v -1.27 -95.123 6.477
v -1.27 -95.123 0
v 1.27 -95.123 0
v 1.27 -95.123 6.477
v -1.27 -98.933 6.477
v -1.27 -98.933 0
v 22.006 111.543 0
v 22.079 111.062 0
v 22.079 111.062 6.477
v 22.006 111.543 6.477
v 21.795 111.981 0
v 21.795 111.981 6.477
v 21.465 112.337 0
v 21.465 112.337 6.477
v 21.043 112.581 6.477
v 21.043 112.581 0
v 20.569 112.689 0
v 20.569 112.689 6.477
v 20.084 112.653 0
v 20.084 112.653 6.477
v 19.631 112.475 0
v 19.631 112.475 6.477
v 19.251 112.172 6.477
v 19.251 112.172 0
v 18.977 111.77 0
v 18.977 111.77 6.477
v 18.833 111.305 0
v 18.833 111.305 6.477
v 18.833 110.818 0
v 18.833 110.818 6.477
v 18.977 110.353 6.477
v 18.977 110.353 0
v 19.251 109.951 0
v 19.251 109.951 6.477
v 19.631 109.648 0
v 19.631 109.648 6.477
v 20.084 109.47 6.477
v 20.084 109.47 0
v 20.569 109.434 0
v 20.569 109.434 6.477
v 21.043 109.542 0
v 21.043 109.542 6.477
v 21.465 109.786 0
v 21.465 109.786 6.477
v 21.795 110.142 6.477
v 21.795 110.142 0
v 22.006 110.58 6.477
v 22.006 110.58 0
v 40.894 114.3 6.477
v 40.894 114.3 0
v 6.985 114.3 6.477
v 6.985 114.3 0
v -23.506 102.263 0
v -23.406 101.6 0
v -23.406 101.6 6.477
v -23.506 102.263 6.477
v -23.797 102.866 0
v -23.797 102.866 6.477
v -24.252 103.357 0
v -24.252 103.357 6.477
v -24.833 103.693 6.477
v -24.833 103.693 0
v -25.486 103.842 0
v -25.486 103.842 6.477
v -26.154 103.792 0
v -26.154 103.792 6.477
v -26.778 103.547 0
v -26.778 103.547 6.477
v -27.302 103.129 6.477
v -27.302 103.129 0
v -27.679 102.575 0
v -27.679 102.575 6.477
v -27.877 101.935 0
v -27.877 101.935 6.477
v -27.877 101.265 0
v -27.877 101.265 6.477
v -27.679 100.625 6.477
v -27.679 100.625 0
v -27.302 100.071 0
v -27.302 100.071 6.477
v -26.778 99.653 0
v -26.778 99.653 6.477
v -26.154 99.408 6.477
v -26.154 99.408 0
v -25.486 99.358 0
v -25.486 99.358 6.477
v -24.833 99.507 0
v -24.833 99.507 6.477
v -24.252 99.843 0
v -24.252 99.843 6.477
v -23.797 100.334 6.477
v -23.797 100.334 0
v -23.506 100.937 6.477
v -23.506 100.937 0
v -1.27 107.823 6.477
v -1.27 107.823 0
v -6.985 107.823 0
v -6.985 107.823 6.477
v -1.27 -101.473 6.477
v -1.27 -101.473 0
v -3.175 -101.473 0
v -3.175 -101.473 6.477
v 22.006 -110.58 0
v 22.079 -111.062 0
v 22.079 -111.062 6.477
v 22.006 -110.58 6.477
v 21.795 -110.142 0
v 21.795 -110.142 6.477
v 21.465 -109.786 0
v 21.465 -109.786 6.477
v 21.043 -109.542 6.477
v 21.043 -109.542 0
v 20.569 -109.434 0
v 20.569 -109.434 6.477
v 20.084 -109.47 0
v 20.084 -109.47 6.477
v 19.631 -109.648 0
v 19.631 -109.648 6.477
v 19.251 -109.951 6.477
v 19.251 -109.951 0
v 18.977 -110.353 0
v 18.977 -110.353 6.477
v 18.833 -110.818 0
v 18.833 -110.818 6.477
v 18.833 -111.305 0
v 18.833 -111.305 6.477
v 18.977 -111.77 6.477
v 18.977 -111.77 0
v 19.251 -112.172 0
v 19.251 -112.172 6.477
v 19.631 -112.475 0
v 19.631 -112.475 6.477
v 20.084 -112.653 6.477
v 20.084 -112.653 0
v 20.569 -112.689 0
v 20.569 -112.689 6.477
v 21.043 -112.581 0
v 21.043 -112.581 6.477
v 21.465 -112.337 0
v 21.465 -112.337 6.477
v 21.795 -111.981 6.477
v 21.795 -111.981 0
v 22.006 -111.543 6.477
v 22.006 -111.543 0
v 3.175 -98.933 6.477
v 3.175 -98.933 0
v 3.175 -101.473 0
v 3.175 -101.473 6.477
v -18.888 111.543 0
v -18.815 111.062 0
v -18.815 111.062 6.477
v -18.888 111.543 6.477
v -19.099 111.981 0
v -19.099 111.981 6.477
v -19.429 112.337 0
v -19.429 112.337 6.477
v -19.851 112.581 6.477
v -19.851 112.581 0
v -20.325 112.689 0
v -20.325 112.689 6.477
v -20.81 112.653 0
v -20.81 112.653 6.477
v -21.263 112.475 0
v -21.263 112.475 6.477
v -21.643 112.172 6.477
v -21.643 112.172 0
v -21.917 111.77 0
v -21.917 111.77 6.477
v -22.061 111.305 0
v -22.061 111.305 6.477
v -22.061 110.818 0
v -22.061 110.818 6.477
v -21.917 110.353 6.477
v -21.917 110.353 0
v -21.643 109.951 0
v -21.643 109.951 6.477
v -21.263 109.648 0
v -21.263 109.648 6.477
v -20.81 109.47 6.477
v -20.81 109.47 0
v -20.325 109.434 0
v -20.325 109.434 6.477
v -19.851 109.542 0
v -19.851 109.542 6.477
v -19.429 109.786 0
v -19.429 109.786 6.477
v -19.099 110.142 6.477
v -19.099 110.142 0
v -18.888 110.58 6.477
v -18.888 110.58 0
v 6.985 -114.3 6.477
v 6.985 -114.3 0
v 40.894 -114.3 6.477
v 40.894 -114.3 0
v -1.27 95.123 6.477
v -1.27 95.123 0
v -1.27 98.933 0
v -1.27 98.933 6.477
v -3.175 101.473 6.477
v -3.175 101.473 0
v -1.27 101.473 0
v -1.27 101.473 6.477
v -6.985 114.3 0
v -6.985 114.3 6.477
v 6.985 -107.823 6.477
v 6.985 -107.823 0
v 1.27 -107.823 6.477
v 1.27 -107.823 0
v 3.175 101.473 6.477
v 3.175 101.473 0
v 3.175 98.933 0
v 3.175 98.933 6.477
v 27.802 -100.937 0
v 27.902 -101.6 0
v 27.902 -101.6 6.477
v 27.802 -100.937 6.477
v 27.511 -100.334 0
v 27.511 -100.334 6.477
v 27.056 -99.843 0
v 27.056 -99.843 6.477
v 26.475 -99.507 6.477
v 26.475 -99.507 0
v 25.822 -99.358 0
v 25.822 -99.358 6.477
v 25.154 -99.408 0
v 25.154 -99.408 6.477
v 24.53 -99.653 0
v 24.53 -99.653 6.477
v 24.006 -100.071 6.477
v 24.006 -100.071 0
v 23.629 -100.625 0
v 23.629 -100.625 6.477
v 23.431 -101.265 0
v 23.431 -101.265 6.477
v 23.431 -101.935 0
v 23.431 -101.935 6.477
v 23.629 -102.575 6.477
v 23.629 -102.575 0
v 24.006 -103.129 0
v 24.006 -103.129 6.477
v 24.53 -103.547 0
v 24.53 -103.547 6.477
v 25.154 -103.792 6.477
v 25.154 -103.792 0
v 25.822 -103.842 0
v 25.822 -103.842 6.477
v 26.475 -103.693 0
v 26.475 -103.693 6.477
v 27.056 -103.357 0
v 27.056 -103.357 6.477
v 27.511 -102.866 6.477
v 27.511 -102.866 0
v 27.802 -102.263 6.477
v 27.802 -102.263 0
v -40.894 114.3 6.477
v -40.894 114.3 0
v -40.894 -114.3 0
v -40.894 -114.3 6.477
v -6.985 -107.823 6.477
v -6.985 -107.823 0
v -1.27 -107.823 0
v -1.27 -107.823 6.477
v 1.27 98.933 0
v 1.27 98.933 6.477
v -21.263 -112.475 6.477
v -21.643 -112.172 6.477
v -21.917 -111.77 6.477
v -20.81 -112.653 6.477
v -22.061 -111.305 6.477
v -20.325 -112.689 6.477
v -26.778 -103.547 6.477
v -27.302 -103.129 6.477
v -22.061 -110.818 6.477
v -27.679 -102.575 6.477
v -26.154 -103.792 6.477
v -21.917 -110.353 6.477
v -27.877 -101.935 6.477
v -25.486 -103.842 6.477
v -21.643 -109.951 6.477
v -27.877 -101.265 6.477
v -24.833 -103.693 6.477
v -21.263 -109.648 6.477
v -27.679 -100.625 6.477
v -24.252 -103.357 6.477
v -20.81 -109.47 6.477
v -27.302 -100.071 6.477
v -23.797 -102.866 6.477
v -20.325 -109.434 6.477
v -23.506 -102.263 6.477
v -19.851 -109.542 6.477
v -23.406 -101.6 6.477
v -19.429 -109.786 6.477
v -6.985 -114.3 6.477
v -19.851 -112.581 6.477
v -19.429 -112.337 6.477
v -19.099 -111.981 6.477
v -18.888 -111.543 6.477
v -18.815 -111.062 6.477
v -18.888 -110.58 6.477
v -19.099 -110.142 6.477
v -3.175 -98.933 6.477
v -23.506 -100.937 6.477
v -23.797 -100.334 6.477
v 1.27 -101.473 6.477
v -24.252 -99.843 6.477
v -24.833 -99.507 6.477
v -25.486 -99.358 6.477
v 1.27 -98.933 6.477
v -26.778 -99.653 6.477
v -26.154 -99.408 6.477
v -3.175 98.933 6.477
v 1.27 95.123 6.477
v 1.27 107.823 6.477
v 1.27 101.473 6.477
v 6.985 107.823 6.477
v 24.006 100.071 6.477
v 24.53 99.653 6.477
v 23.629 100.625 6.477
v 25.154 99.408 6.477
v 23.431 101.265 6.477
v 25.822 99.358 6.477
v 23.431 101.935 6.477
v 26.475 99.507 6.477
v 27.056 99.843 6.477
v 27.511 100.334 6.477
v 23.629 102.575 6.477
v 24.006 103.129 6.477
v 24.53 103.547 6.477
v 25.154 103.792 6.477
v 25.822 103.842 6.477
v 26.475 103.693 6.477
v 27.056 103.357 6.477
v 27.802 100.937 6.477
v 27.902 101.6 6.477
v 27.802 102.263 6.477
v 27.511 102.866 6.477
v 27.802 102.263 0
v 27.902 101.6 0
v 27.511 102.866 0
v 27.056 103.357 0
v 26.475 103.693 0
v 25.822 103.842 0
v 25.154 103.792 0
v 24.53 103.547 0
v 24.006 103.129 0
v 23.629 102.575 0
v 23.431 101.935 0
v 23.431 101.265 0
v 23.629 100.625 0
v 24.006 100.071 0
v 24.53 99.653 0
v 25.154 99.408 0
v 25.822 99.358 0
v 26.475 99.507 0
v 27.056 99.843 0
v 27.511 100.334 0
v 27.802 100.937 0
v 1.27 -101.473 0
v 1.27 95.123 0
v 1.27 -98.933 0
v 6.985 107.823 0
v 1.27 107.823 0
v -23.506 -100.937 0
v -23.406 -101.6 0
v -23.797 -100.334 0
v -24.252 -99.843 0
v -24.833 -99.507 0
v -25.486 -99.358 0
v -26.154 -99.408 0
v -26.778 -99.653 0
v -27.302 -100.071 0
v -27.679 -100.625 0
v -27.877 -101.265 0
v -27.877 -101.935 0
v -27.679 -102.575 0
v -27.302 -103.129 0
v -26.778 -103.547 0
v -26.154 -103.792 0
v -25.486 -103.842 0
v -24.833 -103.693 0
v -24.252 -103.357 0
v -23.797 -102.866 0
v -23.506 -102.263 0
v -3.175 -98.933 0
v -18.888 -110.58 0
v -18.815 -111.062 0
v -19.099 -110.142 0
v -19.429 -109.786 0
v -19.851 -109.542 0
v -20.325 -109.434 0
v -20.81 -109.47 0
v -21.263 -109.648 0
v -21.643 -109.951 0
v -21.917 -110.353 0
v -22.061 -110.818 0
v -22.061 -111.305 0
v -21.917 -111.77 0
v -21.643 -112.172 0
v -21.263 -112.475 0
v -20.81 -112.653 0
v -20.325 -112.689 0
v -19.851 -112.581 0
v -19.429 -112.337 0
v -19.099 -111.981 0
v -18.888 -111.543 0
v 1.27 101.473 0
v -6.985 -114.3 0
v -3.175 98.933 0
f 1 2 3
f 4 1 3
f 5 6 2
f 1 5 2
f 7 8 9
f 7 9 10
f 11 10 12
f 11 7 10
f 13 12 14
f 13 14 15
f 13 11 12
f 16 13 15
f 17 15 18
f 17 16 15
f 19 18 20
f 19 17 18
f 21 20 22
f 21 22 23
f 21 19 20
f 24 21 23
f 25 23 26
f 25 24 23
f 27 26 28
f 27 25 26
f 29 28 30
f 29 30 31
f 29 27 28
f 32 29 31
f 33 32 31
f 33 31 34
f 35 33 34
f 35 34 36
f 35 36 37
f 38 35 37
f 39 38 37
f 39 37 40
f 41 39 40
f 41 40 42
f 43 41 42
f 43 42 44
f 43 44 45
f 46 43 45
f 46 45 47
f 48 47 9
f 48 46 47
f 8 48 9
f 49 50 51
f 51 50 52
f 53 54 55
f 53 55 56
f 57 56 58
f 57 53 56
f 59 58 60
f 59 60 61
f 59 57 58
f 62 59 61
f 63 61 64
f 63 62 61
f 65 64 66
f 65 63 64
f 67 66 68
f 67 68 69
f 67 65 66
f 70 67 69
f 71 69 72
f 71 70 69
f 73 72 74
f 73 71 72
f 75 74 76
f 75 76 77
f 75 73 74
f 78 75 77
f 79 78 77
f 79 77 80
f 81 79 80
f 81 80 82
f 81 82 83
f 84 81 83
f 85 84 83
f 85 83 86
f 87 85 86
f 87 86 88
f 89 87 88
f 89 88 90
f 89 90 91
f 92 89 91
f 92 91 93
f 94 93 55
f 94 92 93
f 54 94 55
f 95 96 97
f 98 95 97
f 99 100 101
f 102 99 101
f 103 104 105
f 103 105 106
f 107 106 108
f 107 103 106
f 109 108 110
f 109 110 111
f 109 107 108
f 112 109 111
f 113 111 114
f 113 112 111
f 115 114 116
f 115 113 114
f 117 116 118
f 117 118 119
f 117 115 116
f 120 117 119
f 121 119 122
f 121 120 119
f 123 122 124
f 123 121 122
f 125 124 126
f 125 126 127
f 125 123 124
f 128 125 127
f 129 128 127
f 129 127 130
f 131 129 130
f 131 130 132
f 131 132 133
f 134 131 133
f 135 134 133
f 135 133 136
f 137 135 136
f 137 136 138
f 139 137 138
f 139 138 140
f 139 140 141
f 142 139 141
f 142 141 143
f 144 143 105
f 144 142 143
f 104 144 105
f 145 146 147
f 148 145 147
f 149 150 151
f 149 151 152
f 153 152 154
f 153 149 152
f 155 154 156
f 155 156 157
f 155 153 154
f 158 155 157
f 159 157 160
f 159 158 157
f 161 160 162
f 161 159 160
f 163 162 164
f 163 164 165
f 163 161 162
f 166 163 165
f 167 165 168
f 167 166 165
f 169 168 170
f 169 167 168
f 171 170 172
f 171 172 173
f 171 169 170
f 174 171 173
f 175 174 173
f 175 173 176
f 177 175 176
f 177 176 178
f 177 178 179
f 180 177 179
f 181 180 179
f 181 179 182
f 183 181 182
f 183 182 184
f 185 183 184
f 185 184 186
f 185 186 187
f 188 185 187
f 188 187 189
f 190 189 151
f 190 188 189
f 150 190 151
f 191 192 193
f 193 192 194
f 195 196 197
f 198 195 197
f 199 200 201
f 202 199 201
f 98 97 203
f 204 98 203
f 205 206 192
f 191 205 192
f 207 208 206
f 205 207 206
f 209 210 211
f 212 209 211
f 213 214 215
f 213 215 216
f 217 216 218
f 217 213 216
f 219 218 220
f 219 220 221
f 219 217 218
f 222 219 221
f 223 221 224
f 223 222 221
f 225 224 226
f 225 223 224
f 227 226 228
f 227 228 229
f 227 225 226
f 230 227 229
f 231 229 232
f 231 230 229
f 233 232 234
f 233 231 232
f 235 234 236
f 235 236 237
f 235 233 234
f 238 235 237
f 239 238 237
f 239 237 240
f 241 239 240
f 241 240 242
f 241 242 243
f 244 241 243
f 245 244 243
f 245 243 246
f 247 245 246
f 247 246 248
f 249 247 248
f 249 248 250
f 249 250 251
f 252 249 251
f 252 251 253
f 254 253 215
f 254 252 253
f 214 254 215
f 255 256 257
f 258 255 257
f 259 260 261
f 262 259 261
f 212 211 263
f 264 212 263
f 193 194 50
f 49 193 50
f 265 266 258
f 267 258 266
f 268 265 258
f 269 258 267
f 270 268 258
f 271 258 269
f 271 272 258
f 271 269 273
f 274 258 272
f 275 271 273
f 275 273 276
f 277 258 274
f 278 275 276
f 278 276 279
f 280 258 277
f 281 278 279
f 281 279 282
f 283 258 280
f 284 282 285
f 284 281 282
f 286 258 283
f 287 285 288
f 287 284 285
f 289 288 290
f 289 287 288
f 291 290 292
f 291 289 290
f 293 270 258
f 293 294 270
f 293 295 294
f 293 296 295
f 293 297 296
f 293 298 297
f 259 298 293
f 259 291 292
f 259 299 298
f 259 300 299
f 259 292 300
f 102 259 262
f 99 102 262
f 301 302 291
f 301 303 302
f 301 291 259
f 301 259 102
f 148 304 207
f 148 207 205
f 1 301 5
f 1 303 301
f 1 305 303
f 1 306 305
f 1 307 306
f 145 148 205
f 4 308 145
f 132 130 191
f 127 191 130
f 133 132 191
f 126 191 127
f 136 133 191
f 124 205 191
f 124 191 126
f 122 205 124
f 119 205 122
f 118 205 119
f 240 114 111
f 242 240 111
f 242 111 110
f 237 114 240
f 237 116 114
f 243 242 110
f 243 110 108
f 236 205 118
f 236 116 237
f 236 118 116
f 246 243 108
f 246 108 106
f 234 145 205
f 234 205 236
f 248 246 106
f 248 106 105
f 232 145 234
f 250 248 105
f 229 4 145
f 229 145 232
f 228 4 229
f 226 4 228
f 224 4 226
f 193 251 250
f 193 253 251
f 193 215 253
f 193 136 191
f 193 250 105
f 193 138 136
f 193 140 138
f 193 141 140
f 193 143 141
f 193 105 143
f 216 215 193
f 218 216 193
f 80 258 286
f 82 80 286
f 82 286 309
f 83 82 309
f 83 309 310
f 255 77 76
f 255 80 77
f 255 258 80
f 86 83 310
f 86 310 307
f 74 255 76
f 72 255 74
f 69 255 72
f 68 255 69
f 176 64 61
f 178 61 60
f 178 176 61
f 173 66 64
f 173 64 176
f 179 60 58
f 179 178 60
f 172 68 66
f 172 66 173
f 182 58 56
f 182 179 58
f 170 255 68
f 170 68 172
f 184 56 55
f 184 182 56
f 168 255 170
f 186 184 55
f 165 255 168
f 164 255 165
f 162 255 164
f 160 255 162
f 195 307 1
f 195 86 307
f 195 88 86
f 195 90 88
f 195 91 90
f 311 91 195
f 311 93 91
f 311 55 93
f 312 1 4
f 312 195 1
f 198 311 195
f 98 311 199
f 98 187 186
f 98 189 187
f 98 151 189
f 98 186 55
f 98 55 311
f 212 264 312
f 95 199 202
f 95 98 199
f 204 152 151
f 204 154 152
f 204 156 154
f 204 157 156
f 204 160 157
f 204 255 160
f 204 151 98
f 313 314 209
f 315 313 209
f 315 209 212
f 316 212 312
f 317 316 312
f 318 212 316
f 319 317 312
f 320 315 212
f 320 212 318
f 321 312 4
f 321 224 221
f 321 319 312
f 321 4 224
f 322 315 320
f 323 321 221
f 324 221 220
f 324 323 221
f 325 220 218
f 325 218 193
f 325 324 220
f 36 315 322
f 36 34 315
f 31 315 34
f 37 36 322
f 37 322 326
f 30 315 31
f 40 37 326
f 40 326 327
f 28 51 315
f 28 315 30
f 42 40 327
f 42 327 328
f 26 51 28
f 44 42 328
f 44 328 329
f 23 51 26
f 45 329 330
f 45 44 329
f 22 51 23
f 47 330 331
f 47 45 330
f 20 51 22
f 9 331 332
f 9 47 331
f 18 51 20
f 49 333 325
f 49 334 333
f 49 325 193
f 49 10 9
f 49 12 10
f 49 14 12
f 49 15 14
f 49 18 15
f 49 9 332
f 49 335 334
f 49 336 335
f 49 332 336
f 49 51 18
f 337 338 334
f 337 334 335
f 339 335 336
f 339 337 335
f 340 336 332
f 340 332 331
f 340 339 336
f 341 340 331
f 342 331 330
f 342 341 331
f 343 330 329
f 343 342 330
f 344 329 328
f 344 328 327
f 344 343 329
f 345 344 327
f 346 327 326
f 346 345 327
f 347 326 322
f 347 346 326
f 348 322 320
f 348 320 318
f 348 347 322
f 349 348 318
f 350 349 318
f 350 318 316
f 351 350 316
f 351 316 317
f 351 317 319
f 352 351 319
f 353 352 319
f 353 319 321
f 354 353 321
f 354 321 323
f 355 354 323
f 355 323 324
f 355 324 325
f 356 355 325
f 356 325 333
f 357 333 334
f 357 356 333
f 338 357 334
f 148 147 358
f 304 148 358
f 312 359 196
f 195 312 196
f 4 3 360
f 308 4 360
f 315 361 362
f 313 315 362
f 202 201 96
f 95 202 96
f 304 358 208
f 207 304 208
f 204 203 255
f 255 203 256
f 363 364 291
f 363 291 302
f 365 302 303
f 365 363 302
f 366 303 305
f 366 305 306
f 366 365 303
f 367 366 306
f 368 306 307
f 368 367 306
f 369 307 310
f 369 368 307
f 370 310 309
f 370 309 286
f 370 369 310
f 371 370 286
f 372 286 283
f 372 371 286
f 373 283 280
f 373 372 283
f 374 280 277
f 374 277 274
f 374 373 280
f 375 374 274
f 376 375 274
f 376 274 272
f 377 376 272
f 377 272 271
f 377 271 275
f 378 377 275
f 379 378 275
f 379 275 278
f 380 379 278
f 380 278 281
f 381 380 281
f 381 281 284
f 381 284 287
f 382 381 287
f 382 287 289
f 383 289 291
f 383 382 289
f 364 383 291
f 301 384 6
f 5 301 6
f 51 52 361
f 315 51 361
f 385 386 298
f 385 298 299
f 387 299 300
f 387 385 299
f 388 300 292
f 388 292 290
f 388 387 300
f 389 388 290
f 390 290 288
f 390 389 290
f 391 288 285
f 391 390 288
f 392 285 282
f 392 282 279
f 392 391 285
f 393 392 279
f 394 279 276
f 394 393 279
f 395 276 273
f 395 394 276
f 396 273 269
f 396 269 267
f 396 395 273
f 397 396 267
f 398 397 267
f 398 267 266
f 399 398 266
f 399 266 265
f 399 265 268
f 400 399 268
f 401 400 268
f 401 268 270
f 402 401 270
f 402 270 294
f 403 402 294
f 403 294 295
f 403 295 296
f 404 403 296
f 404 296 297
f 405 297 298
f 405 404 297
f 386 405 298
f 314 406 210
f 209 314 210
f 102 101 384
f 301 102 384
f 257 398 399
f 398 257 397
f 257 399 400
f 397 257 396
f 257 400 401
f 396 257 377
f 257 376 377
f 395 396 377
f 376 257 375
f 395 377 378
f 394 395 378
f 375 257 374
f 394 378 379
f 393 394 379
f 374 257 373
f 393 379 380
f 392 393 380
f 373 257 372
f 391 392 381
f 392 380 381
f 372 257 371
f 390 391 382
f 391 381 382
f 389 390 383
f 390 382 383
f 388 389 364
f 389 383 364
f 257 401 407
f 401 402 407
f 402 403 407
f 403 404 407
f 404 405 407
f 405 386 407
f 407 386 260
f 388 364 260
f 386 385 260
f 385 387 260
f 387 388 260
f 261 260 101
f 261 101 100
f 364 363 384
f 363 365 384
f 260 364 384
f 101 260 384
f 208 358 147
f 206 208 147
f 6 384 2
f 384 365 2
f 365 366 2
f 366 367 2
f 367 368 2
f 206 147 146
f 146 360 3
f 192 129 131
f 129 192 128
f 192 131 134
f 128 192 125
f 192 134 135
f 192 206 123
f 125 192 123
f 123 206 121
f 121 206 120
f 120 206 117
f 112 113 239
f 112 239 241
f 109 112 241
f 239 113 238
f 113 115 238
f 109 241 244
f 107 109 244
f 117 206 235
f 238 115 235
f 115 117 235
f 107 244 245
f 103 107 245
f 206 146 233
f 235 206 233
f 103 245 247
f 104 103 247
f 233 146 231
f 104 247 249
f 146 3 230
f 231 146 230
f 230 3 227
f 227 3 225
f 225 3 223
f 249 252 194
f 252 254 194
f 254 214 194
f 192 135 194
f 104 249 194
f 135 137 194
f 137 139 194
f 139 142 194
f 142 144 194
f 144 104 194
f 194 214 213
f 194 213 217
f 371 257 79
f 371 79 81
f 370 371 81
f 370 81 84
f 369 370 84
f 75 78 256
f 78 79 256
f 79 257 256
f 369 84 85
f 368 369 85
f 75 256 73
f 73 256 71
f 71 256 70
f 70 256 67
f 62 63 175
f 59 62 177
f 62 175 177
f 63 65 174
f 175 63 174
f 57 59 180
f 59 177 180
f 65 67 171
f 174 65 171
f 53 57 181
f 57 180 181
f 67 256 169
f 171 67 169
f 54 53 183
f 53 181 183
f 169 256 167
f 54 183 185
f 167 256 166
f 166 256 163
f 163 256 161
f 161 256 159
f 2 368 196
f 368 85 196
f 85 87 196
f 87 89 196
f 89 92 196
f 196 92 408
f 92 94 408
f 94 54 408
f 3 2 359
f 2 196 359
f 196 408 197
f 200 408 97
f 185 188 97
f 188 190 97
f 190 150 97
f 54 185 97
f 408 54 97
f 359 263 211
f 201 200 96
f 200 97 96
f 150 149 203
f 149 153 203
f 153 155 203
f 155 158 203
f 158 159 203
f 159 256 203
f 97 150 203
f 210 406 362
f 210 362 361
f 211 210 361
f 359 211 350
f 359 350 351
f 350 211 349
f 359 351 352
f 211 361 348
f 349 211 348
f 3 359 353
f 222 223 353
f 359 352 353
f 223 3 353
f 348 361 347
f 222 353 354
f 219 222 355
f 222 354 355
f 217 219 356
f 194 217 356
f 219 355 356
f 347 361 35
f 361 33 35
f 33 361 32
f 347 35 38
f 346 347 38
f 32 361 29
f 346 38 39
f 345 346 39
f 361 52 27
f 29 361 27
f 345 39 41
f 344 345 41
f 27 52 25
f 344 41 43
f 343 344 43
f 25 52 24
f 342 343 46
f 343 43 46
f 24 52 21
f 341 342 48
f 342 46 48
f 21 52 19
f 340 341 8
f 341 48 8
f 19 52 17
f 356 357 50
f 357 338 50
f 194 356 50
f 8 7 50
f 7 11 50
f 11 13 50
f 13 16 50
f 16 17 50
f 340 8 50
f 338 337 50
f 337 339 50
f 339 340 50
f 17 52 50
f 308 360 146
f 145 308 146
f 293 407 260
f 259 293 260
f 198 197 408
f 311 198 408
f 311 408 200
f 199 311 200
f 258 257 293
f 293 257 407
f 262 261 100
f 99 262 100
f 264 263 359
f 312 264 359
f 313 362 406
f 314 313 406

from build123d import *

# Parameters (mm, degrees)
SKETCH1_R           = 2.2479
SKETCH1_R_2         = 1.63195
BOSS_EXTRUDE1_DEPTH = 6.477


with BuildPart() as part:
    # Sketch1 → Boss-Extrude1 (new body)
    with BuildSketch(Plane.XY):
        Polygon((-6.985, -107.823), (-1.27, -107.823), (-1.27, -101.473), (-3.175, -101.473), (-3.175, -98.933), (-1.27, -98.933), (-1.27, -95.123), (1.27, -95.123), (1.27, -98.933), (3.175, -98.933), (3.175, -101.473), (1.27, -101.473), (1.27, -107.823), (6.985, -107.823), (6.985, -114.3), (40.894, -114.3), (40.894, 114.3), (6.985, 114.3), (6.985, 107.823), (1.27, 107.823), (1.27, 101.473), (3.175, 101.473), (3.175, 98.933), (1.27, 98.933), (1.27, 95.123), (-1.27, 95.123), (-1.27, 98.933), (-3.175, 98.933), (-3.175, 101.473), (-1.27, 101.473), (-1.27, 107.823), (-6.985, 107.823), (-6.985, 114.3), (-40.894, 114.3), (-40.894, -114.3), (-6.985, -114.3), align=None)
        with Locations((-25.654, -101.6)):
            Circle(SKETCH1_R, mode=Mode.SUBTRACT)
        with Locations((-20.447, -111.0615)):
            Circle(SKETCH1_R_2, mode=Mode.SUBTRACT)
        with Locations((20.447, -111.0615)):
            Circle(SKETCH1_R_2, mode=Mode.SUBTRACT)
        with Locations((25.654, -101.6)):
            Circle(SKETCH1_R, mode=Mode.SUBTRACT)
        with Locations((-25.654, 101.6)):
            Circle(SKETCH1_R, mode=Mode.SUBTRACT)
        with Locations((-20.447, 111.0615)):
            Circle(SKETCH1_R_2, mode=Mode.SUBTRACT)
        with Locations((20.447, 111.0615)):
            Circle(SKETCH1_R_2, mode=Mode.SUBTRACT)
        with Locations((25.654, 101.6)):
            Circle(SKETCH1_R, mode=Mode.SUBTRACT)
    extrude(amount=BOSS_EXTRUDE1_DEPTH)


solid = part.part
